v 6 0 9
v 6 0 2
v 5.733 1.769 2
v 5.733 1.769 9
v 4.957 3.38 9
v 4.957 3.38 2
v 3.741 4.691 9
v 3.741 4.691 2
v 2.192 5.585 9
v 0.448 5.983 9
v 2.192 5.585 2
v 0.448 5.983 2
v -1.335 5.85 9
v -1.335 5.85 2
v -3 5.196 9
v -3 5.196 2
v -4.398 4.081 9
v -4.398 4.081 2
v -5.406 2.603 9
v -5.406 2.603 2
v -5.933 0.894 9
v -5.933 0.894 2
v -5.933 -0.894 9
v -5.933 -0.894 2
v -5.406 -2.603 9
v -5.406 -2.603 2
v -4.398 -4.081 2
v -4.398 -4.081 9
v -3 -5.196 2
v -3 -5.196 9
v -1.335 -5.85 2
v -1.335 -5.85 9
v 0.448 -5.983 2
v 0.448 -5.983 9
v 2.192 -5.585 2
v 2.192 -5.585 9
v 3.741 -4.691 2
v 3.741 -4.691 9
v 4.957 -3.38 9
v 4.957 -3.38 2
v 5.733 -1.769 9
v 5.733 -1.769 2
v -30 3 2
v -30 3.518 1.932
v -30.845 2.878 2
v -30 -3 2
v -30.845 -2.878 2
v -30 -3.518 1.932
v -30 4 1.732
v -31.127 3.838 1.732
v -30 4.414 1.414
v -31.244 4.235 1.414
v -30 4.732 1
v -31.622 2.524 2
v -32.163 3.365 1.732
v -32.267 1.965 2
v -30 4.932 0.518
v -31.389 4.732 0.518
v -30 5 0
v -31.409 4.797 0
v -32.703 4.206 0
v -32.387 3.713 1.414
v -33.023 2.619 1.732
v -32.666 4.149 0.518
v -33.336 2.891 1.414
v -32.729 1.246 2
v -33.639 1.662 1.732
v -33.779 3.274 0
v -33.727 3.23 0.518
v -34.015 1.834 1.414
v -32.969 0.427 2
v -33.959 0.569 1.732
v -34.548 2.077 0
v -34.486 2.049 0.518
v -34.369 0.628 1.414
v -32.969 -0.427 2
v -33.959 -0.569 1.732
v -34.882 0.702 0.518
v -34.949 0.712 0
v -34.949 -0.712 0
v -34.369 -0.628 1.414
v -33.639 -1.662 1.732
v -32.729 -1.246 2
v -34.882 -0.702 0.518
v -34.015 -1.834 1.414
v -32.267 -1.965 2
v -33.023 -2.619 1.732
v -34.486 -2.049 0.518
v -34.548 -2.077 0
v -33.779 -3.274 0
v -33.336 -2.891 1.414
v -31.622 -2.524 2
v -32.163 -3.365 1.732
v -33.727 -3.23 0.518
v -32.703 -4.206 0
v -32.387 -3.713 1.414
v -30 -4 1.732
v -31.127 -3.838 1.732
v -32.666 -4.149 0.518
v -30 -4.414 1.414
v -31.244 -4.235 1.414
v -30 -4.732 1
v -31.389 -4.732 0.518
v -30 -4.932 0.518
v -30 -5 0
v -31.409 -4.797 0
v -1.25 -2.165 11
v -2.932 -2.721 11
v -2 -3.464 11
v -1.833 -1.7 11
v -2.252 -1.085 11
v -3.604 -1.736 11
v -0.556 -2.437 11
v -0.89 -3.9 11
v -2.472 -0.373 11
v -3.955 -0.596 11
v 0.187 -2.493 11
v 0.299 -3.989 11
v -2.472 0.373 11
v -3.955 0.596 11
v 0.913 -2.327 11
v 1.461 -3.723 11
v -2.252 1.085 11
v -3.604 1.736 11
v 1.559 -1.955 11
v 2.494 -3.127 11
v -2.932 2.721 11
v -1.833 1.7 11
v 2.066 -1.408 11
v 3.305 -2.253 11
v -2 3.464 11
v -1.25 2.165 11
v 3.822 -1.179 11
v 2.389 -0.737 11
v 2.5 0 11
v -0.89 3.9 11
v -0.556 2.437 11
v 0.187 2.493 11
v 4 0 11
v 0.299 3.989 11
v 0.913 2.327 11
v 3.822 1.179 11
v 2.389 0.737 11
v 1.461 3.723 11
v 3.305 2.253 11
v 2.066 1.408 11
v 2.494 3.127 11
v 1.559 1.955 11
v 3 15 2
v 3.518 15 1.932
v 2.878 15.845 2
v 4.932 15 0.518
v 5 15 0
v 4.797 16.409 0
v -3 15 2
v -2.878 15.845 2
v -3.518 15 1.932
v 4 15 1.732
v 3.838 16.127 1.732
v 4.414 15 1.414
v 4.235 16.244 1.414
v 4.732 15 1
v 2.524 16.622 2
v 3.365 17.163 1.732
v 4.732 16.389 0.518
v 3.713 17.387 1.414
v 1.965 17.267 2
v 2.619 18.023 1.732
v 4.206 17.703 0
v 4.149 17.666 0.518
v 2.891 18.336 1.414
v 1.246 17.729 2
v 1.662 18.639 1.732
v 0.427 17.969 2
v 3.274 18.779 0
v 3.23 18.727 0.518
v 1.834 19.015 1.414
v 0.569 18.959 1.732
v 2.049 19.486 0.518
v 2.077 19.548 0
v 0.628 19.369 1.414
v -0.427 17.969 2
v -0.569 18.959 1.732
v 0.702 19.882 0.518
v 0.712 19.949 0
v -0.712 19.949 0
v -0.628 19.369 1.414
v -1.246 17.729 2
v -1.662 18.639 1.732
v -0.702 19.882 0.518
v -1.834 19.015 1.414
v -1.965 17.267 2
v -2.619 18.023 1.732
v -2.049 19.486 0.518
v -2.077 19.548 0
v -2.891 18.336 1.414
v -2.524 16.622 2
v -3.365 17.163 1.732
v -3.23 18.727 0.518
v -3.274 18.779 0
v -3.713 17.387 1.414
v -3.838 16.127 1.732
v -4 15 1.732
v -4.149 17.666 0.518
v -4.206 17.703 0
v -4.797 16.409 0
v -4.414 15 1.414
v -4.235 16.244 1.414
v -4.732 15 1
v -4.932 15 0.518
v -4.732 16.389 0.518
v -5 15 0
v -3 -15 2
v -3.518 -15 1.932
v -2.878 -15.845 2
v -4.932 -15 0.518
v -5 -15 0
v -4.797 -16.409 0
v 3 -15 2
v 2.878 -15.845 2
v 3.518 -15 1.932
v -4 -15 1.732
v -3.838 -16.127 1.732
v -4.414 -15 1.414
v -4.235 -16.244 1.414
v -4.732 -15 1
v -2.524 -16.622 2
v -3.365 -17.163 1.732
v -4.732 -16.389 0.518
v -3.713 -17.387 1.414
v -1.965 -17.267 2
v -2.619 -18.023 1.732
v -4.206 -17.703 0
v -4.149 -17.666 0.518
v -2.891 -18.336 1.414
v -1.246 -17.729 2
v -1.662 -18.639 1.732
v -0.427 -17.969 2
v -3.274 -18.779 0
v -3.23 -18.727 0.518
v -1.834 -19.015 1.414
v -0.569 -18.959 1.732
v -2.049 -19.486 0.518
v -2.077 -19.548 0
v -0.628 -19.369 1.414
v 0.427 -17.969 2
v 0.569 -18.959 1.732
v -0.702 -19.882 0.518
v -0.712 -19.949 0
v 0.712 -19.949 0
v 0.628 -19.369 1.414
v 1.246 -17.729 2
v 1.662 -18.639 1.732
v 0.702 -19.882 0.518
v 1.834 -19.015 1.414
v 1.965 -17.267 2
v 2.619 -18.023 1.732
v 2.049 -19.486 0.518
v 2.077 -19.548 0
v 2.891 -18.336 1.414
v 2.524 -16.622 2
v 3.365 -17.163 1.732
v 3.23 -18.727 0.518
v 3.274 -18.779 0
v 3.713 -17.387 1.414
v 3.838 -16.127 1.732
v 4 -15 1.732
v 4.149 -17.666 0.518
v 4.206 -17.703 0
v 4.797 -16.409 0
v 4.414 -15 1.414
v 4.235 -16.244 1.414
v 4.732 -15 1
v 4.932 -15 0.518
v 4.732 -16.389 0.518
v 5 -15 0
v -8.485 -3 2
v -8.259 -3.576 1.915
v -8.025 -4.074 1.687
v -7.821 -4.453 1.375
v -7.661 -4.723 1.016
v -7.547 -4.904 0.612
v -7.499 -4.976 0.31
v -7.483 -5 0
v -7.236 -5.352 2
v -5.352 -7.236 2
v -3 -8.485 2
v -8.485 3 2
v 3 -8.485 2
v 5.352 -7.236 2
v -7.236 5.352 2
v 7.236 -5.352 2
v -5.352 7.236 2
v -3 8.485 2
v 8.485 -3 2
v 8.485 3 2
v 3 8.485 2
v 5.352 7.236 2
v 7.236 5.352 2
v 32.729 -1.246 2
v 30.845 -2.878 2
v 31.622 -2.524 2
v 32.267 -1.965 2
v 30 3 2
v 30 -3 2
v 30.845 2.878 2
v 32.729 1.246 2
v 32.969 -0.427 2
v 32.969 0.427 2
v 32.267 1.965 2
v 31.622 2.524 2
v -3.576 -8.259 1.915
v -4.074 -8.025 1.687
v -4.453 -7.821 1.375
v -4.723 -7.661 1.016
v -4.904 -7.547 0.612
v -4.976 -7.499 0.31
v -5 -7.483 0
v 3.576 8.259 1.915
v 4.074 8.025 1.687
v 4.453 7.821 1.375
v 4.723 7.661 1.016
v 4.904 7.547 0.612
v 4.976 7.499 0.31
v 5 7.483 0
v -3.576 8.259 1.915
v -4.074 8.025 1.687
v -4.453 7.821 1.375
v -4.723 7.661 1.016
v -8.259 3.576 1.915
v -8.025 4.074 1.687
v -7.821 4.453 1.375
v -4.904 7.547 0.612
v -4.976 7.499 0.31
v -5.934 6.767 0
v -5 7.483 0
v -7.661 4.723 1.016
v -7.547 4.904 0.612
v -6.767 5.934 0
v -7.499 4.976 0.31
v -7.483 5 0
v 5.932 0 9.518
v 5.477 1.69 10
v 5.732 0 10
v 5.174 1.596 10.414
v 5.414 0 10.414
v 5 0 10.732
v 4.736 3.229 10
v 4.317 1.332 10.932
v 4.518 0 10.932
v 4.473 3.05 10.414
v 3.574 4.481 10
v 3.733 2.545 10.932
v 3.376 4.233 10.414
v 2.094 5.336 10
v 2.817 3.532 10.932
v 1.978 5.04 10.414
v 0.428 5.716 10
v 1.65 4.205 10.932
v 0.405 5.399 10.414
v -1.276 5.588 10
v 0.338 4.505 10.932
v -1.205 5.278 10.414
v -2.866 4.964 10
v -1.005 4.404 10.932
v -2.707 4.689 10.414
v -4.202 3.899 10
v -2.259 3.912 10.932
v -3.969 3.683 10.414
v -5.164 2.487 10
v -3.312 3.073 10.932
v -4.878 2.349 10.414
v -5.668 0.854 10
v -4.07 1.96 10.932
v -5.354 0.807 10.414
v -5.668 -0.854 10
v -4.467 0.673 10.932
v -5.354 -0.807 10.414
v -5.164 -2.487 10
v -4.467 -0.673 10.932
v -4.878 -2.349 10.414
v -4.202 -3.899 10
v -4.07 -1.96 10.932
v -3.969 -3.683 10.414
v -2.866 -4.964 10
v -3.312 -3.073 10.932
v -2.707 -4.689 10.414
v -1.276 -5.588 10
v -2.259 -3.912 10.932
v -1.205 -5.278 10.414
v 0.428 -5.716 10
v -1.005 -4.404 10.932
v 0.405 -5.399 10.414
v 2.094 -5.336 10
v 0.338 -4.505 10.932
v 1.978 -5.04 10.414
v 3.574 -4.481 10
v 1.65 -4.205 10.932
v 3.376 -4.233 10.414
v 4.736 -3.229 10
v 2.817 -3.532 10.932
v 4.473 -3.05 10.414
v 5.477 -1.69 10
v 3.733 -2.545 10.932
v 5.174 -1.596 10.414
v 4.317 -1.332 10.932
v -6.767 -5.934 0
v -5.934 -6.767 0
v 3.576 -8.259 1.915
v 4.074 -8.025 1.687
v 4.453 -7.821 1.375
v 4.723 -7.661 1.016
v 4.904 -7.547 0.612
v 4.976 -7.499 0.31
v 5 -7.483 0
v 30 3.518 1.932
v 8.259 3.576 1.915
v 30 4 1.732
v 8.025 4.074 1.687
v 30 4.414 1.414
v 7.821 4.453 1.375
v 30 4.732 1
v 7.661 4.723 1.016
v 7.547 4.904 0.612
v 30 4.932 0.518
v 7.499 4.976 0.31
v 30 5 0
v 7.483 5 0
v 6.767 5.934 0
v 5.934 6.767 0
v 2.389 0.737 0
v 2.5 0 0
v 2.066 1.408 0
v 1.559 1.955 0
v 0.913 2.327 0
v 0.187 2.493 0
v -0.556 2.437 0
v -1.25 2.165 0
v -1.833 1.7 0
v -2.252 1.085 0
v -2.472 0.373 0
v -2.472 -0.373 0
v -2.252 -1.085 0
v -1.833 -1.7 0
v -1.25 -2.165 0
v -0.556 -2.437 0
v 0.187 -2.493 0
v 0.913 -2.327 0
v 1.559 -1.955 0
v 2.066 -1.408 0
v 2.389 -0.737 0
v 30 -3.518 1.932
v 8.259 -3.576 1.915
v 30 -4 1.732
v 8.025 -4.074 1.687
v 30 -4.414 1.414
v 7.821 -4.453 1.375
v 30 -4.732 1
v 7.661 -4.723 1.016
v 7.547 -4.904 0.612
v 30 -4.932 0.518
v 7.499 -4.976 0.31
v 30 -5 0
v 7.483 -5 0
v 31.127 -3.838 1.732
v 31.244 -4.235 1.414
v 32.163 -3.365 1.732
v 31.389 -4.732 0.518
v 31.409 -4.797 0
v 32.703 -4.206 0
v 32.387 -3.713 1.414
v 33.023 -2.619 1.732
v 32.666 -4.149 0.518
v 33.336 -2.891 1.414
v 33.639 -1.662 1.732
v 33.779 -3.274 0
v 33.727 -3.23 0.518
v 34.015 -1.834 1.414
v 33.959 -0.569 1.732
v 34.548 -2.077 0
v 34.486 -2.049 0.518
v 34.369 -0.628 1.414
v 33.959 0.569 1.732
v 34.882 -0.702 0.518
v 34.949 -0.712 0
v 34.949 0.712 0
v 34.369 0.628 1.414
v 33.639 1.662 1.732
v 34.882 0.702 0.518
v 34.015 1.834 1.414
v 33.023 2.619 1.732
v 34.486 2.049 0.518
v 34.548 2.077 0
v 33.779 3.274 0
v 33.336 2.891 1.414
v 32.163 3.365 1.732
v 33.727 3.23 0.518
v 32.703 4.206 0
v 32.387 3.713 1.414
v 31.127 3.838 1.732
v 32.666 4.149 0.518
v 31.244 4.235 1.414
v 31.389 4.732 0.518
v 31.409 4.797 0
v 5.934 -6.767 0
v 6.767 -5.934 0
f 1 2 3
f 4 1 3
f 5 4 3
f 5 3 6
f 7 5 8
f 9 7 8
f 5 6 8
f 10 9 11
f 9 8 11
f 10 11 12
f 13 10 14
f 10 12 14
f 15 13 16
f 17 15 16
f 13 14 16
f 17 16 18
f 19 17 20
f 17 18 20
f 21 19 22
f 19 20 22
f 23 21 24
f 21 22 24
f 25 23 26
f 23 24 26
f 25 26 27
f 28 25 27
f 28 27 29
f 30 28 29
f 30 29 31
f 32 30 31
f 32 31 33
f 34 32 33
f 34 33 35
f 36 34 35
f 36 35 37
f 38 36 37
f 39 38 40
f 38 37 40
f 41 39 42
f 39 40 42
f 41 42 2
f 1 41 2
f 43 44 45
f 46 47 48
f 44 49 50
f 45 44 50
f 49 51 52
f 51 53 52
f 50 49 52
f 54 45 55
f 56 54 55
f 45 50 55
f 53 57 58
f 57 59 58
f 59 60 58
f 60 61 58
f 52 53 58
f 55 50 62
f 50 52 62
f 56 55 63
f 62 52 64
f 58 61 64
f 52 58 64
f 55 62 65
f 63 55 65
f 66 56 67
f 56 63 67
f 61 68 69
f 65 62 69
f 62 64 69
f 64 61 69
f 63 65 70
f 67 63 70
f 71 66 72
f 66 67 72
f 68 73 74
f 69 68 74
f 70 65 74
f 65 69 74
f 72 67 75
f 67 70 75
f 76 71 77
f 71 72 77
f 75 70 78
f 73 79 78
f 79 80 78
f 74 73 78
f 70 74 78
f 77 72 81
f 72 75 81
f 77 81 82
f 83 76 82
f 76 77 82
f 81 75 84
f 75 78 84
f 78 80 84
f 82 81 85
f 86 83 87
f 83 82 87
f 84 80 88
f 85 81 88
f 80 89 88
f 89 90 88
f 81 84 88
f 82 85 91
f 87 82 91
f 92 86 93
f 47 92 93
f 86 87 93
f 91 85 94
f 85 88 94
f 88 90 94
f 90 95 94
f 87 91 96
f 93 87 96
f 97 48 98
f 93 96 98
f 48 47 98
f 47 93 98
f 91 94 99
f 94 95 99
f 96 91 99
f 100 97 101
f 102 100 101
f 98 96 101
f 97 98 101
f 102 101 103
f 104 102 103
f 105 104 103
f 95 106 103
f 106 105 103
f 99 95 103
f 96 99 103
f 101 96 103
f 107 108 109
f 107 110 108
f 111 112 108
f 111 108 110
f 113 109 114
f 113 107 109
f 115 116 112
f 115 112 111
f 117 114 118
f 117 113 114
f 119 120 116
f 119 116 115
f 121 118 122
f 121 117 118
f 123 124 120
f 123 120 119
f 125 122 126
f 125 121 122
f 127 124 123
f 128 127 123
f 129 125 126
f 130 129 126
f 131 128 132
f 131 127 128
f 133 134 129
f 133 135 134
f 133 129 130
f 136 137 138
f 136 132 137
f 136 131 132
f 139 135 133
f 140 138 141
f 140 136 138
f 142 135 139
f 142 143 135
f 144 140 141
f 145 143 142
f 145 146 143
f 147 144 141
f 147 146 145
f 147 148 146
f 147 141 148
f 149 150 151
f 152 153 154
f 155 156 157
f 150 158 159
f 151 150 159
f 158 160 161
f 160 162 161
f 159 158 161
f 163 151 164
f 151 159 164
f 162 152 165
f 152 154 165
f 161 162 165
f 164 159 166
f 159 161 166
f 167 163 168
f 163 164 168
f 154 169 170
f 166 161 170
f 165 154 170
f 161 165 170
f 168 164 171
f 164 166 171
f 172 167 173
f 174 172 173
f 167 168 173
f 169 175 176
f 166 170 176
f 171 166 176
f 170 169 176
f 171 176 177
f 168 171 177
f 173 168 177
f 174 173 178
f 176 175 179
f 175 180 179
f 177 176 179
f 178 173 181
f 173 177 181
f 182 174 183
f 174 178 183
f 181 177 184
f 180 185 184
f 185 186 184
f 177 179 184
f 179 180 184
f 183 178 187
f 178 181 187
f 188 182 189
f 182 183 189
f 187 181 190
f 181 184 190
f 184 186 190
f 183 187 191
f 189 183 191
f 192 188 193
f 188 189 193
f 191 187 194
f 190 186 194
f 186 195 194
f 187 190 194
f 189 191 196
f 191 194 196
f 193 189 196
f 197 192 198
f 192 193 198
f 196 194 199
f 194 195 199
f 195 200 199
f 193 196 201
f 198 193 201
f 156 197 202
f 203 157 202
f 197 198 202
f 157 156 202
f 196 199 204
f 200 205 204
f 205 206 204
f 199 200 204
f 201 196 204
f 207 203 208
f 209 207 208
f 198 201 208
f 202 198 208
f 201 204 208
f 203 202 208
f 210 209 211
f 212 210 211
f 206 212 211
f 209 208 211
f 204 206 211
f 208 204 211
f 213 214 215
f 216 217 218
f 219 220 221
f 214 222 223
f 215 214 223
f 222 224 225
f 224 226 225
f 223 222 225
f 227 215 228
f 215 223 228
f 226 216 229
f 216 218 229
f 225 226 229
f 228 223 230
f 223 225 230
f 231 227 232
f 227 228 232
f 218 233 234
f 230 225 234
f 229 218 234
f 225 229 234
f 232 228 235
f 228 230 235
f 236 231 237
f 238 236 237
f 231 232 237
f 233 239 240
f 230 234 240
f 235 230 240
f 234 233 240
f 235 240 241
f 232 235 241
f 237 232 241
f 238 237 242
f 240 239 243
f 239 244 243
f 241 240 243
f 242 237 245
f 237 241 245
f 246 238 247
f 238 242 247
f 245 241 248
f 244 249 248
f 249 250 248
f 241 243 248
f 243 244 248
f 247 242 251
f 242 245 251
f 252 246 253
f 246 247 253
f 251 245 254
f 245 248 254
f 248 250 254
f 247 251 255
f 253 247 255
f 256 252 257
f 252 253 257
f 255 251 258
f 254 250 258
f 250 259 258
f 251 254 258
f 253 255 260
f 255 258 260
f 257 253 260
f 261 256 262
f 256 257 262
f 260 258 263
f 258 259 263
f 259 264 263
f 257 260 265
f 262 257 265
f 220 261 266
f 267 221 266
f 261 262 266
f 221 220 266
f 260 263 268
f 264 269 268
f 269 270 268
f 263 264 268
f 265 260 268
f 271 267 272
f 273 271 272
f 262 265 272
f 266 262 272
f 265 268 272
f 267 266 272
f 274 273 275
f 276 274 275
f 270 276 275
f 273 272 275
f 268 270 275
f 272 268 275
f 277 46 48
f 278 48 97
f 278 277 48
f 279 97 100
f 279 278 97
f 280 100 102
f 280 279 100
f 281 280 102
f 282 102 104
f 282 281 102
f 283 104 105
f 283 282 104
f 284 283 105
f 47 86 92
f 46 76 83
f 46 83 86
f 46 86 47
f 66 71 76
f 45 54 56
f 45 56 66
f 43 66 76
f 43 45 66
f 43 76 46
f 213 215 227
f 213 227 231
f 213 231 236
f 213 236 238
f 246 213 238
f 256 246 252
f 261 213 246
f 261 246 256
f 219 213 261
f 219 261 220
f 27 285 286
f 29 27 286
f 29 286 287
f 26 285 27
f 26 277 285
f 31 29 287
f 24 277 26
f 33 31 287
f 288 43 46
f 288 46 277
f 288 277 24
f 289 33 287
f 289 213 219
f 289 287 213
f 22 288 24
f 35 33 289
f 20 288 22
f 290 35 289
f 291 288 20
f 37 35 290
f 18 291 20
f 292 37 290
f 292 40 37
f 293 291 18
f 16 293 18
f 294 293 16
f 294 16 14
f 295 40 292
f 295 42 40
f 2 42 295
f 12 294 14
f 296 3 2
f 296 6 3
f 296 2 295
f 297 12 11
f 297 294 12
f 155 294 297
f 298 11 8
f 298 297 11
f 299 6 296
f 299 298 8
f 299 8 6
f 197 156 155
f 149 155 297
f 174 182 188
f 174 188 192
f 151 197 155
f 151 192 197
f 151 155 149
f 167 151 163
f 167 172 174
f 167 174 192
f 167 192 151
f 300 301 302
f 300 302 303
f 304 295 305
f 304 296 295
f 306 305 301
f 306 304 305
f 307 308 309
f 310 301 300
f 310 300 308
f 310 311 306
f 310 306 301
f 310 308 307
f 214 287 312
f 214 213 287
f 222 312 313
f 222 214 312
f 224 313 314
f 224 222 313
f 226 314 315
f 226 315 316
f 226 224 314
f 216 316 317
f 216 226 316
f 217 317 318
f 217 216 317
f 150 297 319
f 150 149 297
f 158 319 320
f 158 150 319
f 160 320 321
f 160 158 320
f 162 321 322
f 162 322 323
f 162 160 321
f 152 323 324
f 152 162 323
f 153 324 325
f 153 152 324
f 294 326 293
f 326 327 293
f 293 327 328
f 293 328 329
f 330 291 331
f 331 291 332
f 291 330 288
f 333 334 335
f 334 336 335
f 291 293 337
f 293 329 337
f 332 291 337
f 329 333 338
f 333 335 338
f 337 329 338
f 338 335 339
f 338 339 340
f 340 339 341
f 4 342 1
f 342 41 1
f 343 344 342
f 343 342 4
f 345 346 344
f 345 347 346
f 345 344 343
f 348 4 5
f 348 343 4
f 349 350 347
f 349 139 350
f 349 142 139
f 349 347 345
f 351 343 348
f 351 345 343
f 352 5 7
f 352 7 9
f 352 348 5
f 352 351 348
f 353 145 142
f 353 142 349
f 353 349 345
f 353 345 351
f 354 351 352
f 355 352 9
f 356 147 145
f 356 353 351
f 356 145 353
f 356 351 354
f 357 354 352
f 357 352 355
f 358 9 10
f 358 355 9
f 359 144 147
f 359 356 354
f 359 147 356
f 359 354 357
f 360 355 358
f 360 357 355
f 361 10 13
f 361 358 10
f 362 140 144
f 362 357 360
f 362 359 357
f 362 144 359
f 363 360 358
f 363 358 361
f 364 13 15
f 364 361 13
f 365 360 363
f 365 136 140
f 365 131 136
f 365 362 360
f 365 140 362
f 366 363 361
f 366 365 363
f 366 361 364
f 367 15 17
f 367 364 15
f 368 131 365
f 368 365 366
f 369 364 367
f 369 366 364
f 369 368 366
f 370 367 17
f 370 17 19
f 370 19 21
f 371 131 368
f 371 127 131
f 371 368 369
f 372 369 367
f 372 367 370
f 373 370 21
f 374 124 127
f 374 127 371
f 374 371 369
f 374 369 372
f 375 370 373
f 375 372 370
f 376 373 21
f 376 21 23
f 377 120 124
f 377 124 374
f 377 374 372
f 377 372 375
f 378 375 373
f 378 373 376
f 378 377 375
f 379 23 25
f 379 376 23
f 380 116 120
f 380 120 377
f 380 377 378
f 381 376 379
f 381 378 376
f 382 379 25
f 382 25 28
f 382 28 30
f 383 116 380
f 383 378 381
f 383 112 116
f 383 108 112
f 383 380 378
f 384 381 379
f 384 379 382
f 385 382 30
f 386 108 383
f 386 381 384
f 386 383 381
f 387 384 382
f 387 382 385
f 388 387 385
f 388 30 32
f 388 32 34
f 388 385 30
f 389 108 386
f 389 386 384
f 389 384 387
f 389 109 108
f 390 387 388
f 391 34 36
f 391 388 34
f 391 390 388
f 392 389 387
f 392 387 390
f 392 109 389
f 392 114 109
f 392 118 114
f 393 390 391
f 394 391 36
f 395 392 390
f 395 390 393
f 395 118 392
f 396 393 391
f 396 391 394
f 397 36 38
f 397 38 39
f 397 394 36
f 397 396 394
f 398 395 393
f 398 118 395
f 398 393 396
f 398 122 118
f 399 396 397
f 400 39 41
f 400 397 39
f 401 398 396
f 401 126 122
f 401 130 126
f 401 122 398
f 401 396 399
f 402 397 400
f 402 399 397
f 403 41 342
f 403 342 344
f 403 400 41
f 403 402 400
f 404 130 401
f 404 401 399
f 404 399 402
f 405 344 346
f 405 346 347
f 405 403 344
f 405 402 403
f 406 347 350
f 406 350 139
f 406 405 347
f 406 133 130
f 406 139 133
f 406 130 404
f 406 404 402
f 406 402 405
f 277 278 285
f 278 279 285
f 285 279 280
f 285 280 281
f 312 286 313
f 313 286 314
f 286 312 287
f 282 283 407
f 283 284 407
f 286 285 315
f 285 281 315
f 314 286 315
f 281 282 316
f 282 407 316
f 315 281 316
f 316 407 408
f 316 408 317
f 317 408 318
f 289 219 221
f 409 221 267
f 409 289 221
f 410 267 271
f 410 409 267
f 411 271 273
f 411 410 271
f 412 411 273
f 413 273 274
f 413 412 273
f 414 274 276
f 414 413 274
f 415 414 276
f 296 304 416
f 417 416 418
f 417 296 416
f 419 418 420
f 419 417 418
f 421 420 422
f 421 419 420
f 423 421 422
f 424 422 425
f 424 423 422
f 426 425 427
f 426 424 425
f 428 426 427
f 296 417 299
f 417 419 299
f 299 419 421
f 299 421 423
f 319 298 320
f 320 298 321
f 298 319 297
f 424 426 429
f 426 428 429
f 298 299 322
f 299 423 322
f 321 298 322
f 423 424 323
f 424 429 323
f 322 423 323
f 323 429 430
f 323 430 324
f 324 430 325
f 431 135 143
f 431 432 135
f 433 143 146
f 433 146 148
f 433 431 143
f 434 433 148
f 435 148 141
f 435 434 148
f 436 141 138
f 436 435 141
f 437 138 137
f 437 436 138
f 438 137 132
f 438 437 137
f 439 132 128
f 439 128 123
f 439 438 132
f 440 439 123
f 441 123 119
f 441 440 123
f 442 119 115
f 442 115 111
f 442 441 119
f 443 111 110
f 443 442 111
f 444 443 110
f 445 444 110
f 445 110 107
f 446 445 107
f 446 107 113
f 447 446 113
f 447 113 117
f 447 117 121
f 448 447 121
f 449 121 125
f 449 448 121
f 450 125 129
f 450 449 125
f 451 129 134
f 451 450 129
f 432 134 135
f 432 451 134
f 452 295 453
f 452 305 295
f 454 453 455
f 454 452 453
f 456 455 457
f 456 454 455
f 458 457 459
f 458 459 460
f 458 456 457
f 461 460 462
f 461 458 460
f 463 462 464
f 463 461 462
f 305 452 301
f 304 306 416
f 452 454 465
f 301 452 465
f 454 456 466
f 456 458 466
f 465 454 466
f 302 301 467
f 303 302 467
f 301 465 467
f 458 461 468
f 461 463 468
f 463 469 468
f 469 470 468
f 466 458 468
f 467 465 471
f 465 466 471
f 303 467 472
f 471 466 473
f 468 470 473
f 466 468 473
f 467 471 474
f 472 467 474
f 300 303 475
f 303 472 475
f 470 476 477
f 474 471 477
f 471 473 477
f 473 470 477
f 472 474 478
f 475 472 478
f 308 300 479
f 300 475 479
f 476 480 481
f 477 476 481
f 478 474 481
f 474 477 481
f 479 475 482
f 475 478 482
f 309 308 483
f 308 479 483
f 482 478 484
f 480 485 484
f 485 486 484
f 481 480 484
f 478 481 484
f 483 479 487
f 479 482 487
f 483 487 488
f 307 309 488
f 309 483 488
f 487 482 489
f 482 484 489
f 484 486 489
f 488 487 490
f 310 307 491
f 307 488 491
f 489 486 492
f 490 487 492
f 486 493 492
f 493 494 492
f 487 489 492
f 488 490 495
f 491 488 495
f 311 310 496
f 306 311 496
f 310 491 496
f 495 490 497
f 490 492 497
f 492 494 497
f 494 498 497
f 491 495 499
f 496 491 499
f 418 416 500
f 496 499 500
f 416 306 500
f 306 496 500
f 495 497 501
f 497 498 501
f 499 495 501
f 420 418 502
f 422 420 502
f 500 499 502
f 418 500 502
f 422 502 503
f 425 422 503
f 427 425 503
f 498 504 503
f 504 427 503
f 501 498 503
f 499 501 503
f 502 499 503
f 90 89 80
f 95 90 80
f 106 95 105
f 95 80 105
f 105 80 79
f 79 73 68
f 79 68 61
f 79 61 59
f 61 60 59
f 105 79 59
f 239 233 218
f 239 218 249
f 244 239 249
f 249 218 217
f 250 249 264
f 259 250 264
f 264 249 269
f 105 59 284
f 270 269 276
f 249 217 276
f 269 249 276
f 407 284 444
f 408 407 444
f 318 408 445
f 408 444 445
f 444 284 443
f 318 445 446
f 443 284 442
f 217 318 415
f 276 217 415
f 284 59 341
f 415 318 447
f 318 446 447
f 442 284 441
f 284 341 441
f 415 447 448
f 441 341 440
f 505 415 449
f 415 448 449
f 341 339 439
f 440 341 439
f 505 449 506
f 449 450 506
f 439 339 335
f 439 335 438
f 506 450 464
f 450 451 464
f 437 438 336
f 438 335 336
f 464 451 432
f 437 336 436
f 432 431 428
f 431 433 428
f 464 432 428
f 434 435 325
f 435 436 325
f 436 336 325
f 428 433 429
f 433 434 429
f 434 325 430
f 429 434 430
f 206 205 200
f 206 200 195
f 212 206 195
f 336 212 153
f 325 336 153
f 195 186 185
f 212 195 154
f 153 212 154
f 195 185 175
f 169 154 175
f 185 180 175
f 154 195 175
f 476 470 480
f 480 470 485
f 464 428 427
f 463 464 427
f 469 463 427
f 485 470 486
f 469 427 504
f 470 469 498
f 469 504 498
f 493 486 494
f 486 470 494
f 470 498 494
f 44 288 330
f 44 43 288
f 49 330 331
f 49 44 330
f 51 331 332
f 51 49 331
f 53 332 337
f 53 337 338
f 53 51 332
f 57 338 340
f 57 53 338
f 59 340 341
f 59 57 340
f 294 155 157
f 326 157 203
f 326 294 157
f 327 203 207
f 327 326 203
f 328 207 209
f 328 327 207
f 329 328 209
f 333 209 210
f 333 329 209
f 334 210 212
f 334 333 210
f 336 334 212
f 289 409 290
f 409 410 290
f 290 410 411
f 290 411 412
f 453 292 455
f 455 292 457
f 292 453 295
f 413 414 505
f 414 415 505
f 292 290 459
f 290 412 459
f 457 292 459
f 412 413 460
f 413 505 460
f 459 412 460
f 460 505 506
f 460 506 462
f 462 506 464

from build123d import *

# Parameters (mm, degrees)
F0_R     = 2.5
F1_DEPTH = 2
F2_R     = 6
F2_R_2   = 2.5
F3_DEPTH = 9
F4_R     = 2
F5_R     = 1.99999


# Not quite as in the source:
# - a fillet or chamfer is up to 0.001 mm smaller than in the source, because OpenCascade refuses the exact size


with BuildPart() as f1:
    # F0 (on Top) → F1 (new body)
    with BuildSketch(Plane.XY):
        with BuildLine():
            Line((-30, -5), (-7.4833147735, -5))
            ThreePointArc((-7.4833147735, -5), (-6.3639610307, -6.3639610307), (-5, -7.4833147735))
            Line((-5, -7.4833147735), (-5, -15))
            ThreePointArc((-5, -15), (0, -20), (5, -15))
            Line((5, -15), (5, -7.4833147735))
            ThreePointArc((5, -7.4833147735), (6.3639610307, -6.3639610307), (7.4833147735, -5))
            Line((7.4833147735, -5), (30, -5))
            ThreePointArc((30, -5), (35, 0), (30, 5))
            Line((30, 5), (7.4833147735, 5))
            ThreePointArc((7.4833147735, 5), (6.3639610307, 6.3639610307), (5, 7.4833147735))
            Line((5, 7.4833147735), (5, 15))
            ThreePointArc((5, 15), (0, 20), (-5, 15))
            Line((-5, 15), (-5, 7.4833147735))
            ThreePointArc((-5, 7.4833147735), (-6.3639610307, 6.3639610307), (-7.4833147735, 5))
            Line((-7.4833147735, 5), (-30, 5))
            ThreePointArc((-30, 5), (-35, 0), (-30, -5))
        make_face()
        Circle(F0_R, mode=Mode.SUBTRACT)
    extrude(amount=F1_DEPTH)

    # F2 (on face) → F3 (join)
    with BuildSketch(Plane.XY.offset(2)):
        Circle(F2_R)
        Circle(F2_R_2, mode=Mode.SUBTRACT)
    extrude(amount=F3_DEPTH)

    # F4
    f4_edges = [f1.edges().sort_by_distance(p)[0] for p in [
        (-6, 0, 11),
    ]]
    fillet(f4_edges, radius=F4_R)

    # F5 (radius 2 in the source; OpenCascade refuses exactly that, so slightly less here)
    f5_edges = [f1.edges().sort_by_distance(p)[0] for p in [
        (35, 0, 2),
        (0, 20, 2),
        (0, -20, 2),
        (-35, 0, 2),
    ]]
    fillet(f5_edges, radius=F5_R)


solid = f1.part
